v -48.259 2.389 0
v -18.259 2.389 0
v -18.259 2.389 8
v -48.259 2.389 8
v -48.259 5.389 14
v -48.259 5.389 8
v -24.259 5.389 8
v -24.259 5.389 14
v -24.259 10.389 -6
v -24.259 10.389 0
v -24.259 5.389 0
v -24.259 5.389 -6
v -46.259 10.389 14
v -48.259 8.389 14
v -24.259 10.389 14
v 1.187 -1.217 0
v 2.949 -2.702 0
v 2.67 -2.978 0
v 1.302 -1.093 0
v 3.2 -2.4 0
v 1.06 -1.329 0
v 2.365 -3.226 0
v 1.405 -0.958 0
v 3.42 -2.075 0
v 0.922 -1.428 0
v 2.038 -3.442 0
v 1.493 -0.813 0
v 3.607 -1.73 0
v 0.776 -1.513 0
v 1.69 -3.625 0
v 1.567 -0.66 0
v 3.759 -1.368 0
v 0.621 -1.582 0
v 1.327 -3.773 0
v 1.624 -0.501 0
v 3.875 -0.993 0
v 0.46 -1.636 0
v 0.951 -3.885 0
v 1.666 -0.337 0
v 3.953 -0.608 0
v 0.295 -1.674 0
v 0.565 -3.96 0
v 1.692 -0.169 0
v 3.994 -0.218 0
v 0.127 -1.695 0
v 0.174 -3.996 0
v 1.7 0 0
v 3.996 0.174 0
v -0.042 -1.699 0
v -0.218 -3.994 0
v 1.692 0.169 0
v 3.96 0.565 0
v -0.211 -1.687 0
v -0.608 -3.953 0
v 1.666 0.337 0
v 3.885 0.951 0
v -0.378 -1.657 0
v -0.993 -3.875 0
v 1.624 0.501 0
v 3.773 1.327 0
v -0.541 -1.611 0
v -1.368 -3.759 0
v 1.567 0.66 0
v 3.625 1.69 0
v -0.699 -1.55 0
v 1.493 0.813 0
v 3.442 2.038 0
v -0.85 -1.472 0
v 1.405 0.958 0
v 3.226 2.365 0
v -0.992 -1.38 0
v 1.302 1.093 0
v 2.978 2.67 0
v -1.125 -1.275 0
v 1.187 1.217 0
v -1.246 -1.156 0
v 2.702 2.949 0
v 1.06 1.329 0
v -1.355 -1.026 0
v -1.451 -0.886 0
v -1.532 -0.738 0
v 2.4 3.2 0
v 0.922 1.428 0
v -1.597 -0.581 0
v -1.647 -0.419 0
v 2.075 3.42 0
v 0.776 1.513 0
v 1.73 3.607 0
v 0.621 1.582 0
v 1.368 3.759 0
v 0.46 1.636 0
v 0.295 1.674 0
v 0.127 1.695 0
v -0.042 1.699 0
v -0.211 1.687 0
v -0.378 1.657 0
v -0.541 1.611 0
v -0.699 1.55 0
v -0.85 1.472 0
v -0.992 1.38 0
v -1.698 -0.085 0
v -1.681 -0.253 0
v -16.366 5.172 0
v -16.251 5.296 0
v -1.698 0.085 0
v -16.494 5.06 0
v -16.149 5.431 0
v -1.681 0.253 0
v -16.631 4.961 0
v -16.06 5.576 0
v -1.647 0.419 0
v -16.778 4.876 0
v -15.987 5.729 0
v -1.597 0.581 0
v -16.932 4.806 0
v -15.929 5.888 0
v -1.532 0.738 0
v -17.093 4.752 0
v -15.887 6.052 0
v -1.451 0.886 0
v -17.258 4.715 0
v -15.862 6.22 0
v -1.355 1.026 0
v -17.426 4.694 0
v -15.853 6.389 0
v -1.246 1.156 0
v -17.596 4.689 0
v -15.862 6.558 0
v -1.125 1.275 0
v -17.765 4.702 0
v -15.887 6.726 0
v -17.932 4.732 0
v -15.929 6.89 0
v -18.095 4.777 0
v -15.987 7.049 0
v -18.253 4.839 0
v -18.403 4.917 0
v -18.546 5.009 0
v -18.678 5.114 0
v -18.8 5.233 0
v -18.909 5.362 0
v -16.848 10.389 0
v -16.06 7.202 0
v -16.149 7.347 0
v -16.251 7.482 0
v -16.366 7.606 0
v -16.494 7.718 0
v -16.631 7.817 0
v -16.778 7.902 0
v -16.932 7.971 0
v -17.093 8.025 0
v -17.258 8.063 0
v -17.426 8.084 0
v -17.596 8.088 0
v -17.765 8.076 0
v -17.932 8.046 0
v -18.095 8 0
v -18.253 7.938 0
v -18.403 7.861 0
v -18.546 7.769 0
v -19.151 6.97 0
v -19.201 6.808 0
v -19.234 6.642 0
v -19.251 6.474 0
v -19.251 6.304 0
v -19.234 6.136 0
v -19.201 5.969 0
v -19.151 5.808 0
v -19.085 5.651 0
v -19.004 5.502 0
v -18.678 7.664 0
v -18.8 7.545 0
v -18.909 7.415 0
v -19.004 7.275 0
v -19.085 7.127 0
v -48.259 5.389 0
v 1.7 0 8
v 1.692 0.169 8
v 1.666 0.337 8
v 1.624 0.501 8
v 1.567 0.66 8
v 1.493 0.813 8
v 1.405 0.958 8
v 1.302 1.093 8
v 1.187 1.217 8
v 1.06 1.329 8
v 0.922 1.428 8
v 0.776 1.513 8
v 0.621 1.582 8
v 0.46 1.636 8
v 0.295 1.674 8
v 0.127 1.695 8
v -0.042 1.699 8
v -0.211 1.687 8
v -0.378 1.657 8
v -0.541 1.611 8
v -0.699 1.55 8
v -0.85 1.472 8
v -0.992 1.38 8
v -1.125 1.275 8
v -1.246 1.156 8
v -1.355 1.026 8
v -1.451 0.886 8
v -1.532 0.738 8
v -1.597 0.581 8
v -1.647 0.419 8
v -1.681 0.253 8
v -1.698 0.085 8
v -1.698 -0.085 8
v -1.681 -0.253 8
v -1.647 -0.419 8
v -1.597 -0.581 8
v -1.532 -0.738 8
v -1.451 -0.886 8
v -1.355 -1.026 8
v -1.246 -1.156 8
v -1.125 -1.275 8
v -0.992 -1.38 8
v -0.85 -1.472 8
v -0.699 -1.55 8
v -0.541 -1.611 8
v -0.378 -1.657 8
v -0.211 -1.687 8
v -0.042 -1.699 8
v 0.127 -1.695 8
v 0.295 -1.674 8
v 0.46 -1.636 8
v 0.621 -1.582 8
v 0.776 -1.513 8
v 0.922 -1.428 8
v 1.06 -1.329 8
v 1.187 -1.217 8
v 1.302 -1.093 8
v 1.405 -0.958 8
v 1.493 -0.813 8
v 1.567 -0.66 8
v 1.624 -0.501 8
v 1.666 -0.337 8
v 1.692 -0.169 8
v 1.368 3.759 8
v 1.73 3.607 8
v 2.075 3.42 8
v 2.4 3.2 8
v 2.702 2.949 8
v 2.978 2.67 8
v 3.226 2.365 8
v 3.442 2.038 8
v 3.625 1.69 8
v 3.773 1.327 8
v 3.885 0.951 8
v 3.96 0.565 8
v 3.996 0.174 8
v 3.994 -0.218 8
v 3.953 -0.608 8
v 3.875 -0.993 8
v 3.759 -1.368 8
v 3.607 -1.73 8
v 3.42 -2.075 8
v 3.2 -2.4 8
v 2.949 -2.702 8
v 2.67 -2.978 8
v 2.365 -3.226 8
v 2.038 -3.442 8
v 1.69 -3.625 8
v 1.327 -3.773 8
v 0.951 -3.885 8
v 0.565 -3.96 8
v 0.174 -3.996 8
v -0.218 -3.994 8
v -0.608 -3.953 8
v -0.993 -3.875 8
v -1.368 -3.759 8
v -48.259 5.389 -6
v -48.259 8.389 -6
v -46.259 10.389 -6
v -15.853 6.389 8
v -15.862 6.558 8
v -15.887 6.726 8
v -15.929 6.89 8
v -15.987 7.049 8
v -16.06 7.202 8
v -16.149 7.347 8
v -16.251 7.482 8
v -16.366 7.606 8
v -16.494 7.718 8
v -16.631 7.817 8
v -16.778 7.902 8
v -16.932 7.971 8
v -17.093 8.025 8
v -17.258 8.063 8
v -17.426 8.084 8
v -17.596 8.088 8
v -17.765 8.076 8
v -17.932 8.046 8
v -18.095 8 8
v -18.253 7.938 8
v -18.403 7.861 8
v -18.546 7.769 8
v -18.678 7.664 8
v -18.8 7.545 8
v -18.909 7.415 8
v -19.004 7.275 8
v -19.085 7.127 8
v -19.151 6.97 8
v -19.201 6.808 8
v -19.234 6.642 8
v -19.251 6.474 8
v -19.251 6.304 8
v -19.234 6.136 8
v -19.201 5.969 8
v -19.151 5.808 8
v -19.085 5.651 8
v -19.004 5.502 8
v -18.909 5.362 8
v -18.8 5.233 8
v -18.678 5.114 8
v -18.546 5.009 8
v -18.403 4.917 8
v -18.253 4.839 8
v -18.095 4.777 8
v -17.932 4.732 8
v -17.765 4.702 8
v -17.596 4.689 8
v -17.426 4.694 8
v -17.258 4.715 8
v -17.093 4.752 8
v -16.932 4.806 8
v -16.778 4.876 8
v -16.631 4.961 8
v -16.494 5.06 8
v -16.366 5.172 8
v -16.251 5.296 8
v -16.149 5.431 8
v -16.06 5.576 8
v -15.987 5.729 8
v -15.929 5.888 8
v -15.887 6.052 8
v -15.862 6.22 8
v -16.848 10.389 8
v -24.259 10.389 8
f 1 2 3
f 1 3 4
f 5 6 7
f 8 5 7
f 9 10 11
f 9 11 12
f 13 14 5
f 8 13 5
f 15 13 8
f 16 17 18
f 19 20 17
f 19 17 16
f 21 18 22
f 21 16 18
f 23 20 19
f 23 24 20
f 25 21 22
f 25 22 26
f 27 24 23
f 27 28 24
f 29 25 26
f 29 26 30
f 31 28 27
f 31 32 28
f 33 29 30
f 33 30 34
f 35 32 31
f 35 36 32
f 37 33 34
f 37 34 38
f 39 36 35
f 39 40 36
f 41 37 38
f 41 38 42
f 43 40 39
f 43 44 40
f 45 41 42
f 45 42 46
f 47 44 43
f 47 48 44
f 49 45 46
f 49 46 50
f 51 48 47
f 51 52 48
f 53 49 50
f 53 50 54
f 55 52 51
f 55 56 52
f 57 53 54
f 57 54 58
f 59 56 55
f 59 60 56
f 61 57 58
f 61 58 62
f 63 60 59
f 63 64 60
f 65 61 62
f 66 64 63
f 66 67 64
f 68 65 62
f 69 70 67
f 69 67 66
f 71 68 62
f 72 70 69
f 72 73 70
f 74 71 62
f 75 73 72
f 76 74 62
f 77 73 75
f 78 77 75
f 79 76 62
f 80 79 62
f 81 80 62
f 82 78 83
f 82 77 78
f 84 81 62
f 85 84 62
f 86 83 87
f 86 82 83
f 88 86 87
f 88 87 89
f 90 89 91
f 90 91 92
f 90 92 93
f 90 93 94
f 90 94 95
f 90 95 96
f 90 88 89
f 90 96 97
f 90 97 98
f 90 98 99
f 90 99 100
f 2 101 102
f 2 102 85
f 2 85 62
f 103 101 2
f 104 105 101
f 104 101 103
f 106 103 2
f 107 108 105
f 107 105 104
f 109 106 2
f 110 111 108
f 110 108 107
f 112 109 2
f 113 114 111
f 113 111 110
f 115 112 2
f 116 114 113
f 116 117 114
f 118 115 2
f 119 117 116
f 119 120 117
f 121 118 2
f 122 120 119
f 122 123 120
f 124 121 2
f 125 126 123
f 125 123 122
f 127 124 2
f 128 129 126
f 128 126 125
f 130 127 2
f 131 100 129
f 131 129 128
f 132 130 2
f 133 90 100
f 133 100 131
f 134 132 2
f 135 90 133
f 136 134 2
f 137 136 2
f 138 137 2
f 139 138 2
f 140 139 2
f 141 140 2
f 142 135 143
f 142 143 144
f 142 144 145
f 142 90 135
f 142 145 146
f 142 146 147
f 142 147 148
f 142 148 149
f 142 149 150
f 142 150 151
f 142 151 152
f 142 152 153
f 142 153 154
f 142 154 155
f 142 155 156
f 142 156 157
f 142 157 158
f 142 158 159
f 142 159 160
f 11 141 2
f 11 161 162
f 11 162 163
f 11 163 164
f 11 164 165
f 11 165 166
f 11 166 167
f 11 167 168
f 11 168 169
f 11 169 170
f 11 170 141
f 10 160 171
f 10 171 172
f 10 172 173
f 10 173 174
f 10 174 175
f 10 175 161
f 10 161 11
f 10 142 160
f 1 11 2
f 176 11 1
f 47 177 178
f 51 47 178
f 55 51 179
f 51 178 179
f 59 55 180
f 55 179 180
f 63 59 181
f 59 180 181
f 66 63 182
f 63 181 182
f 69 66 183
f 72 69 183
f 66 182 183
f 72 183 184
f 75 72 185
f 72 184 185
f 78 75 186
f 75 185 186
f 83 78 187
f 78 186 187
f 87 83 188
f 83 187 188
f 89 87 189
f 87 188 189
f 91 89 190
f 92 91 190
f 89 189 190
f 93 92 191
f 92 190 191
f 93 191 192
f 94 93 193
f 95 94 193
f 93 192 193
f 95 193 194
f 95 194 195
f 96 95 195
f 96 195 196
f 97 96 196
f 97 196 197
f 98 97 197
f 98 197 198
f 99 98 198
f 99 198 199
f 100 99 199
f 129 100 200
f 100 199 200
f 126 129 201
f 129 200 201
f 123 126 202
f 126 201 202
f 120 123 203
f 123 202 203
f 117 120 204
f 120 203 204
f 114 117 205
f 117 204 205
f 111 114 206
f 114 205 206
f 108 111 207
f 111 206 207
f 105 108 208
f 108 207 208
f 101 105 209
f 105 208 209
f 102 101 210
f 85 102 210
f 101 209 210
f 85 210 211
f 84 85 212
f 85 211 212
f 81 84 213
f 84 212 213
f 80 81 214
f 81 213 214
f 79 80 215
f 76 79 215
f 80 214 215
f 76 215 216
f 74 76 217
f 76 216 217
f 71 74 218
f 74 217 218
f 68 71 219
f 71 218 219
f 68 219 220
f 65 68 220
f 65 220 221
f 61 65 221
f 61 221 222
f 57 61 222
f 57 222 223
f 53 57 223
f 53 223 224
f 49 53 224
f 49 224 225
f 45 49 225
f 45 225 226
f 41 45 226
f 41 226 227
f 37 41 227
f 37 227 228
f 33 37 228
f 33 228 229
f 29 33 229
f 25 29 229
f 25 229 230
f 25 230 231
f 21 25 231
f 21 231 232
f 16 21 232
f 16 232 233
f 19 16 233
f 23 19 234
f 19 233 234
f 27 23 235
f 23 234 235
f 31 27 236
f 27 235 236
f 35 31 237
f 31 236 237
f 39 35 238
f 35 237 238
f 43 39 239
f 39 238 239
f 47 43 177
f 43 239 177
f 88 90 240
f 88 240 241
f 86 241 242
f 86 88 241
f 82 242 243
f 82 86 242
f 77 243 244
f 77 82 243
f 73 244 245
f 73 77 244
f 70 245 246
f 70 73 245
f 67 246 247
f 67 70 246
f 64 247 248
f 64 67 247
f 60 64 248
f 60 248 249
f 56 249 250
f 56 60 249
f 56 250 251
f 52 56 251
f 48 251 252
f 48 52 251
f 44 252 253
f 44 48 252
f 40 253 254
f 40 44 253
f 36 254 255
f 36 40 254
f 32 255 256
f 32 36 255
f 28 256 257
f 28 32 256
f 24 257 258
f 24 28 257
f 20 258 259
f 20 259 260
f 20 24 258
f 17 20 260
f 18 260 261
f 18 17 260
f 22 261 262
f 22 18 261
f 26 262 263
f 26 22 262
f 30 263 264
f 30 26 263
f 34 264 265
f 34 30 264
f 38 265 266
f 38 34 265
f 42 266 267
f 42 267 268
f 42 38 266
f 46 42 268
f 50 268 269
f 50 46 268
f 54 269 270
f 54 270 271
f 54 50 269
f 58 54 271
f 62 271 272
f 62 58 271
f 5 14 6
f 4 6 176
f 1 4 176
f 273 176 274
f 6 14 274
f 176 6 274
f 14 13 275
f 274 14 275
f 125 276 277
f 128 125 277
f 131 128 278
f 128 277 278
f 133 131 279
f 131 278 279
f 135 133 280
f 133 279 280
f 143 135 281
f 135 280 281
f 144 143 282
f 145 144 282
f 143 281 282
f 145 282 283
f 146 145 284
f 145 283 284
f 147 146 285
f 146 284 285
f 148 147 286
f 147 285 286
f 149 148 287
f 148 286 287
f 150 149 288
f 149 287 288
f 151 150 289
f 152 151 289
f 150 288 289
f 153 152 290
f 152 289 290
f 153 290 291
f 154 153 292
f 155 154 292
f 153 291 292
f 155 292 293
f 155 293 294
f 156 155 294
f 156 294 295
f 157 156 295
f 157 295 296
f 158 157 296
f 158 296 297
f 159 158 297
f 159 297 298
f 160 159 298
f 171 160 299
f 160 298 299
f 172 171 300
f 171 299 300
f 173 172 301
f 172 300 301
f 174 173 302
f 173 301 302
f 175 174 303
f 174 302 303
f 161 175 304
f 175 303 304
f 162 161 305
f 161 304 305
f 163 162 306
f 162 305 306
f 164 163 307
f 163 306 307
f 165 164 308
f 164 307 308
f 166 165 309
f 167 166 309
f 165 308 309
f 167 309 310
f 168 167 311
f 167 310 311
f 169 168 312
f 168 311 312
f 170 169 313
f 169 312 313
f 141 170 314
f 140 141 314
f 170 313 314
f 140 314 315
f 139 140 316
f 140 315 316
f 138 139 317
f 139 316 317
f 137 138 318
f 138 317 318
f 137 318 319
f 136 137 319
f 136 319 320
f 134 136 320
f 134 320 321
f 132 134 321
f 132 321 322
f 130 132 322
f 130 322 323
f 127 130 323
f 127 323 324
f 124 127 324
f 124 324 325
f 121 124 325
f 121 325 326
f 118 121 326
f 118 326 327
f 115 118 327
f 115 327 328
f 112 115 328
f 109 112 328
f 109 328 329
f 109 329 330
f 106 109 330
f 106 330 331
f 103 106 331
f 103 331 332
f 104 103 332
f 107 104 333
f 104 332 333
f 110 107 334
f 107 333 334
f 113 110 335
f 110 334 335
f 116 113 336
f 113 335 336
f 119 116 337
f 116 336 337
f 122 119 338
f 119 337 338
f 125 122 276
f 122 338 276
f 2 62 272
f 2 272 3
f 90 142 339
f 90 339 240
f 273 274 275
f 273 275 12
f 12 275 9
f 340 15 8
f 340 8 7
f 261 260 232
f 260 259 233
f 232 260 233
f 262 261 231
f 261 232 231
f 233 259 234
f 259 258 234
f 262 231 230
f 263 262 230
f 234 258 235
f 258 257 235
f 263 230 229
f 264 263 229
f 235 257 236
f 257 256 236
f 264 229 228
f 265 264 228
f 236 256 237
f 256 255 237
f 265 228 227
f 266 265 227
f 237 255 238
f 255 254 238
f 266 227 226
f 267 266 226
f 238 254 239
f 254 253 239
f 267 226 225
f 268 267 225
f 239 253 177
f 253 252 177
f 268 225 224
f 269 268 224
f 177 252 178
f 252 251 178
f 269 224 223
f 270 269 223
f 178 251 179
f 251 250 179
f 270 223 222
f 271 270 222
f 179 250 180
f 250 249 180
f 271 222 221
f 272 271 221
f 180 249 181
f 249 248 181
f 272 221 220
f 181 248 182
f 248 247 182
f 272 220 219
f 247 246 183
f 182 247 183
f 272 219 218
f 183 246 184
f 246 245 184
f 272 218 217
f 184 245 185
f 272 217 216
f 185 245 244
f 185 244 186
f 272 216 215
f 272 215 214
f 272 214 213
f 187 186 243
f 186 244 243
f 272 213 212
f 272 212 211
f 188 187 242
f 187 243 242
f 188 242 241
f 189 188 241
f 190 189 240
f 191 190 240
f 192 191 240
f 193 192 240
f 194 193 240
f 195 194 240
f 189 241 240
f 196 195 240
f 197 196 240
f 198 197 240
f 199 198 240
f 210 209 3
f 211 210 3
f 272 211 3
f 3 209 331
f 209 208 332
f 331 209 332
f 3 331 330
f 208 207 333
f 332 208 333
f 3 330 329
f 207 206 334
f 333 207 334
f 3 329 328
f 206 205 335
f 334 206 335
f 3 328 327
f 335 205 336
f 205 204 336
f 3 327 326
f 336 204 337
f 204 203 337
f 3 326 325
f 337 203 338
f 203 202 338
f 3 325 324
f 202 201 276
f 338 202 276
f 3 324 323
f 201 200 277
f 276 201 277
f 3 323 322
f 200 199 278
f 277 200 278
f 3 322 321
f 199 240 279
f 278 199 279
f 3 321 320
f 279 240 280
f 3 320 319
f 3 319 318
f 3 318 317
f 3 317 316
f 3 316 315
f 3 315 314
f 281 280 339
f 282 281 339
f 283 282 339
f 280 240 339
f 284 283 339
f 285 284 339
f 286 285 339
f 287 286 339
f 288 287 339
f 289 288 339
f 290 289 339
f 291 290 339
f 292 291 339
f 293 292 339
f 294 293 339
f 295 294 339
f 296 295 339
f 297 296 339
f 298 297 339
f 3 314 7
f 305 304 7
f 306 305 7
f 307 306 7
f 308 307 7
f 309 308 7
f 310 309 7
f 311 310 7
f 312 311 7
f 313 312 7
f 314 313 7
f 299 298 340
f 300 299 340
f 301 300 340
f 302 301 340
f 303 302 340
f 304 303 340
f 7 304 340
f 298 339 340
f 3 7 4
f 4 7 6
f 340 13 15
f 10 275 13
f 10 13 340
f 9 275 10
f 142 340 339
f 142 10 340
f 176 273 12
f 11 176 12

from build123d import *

# Parameters (mm, degrees)
EXTRUDE_1_DEPTH     = 8
SKETCH_2_R          = 1.7
CUT_EXTRUDE_1_DEPTH = 8
SKETCH_3_R          = 1.7
CUT_EXTRUDE_2_DEPTH = 8
SKETCH_4_W          = 24
SKETCH_4_H          = 20
EXTRUDE_2_DEPTH     = 5
CHAMFER_1_SIZE      = 2


with BuildPart() as part:
    # 草图1 → 凸台-拉伸1 (new body)
    with BuildSketch(Plane.XY):
        with BuildLine():
            Line((-1.368080573, -3.758770483), (-18.258766079, 2.388936277))
            Line((-18.258766079, 2.388936277), (-48.258766079, 2.388936277))
            Line((-48.258766079, 2.388936277), (-48.258766079, 10.388936277))
            Line((-48.258766079, 10.388936277), (-16.848150233, 10.388936277))
            Line((-16.848150233, 10.388936277), (1.368080573, 3.758770483))
            ThreePointArc((1.368080573, 3.758770483), (3.758770483, -1.368080573), (-1.368080573, -3.758770483))
        make_face()
    extrude(amount=EXTRUDE_1_DEPTH)

    # 草图2 → 切除-拉伸1 (cut)
    with BuildSketch(Plane.XY.offset(8)):
        Circle(SKETCH_2_R)
    extrude(amount=-CUT_EXTRUDE_1_DEPTH, mode=Mode.SUBTRACT)

    # 草图3 → 切除-拉伸2 (cut)
    with BuildSketch(Plane.XY.offset(8)):
        with Locations((-17.553458156, 6.388936277)):
            Circle(SKETCH_3_R)
    extrude(amount=-CUT_EXTRUDE_2_DEPTH, mode=Mode.SUBTRACT)

    # 草图4 → 凸台-拉伸2 (add)
    with BuildSketch(Plane(origin=(0, 10.388936277, 0), x_dir=(1, 0, 0), z_dir=(0, 1, 0))):
        with Locations((-36.258766079, -4)):
            Rectangle(SKETCH_4_W, SKETCH_4_H)
    extrude(amount=-EXTRUDE_2_DEPTH)

    # 倒角1
    chamfer_1_edges = [part.edges().sort_by_distance(p)[0] for p in [
        (-48.258766079, 10.388936277, 4),
    ]]
    chamfer(chamfer_1_edges, length=CHAMFER_1_SIZE)


solid = part.part
